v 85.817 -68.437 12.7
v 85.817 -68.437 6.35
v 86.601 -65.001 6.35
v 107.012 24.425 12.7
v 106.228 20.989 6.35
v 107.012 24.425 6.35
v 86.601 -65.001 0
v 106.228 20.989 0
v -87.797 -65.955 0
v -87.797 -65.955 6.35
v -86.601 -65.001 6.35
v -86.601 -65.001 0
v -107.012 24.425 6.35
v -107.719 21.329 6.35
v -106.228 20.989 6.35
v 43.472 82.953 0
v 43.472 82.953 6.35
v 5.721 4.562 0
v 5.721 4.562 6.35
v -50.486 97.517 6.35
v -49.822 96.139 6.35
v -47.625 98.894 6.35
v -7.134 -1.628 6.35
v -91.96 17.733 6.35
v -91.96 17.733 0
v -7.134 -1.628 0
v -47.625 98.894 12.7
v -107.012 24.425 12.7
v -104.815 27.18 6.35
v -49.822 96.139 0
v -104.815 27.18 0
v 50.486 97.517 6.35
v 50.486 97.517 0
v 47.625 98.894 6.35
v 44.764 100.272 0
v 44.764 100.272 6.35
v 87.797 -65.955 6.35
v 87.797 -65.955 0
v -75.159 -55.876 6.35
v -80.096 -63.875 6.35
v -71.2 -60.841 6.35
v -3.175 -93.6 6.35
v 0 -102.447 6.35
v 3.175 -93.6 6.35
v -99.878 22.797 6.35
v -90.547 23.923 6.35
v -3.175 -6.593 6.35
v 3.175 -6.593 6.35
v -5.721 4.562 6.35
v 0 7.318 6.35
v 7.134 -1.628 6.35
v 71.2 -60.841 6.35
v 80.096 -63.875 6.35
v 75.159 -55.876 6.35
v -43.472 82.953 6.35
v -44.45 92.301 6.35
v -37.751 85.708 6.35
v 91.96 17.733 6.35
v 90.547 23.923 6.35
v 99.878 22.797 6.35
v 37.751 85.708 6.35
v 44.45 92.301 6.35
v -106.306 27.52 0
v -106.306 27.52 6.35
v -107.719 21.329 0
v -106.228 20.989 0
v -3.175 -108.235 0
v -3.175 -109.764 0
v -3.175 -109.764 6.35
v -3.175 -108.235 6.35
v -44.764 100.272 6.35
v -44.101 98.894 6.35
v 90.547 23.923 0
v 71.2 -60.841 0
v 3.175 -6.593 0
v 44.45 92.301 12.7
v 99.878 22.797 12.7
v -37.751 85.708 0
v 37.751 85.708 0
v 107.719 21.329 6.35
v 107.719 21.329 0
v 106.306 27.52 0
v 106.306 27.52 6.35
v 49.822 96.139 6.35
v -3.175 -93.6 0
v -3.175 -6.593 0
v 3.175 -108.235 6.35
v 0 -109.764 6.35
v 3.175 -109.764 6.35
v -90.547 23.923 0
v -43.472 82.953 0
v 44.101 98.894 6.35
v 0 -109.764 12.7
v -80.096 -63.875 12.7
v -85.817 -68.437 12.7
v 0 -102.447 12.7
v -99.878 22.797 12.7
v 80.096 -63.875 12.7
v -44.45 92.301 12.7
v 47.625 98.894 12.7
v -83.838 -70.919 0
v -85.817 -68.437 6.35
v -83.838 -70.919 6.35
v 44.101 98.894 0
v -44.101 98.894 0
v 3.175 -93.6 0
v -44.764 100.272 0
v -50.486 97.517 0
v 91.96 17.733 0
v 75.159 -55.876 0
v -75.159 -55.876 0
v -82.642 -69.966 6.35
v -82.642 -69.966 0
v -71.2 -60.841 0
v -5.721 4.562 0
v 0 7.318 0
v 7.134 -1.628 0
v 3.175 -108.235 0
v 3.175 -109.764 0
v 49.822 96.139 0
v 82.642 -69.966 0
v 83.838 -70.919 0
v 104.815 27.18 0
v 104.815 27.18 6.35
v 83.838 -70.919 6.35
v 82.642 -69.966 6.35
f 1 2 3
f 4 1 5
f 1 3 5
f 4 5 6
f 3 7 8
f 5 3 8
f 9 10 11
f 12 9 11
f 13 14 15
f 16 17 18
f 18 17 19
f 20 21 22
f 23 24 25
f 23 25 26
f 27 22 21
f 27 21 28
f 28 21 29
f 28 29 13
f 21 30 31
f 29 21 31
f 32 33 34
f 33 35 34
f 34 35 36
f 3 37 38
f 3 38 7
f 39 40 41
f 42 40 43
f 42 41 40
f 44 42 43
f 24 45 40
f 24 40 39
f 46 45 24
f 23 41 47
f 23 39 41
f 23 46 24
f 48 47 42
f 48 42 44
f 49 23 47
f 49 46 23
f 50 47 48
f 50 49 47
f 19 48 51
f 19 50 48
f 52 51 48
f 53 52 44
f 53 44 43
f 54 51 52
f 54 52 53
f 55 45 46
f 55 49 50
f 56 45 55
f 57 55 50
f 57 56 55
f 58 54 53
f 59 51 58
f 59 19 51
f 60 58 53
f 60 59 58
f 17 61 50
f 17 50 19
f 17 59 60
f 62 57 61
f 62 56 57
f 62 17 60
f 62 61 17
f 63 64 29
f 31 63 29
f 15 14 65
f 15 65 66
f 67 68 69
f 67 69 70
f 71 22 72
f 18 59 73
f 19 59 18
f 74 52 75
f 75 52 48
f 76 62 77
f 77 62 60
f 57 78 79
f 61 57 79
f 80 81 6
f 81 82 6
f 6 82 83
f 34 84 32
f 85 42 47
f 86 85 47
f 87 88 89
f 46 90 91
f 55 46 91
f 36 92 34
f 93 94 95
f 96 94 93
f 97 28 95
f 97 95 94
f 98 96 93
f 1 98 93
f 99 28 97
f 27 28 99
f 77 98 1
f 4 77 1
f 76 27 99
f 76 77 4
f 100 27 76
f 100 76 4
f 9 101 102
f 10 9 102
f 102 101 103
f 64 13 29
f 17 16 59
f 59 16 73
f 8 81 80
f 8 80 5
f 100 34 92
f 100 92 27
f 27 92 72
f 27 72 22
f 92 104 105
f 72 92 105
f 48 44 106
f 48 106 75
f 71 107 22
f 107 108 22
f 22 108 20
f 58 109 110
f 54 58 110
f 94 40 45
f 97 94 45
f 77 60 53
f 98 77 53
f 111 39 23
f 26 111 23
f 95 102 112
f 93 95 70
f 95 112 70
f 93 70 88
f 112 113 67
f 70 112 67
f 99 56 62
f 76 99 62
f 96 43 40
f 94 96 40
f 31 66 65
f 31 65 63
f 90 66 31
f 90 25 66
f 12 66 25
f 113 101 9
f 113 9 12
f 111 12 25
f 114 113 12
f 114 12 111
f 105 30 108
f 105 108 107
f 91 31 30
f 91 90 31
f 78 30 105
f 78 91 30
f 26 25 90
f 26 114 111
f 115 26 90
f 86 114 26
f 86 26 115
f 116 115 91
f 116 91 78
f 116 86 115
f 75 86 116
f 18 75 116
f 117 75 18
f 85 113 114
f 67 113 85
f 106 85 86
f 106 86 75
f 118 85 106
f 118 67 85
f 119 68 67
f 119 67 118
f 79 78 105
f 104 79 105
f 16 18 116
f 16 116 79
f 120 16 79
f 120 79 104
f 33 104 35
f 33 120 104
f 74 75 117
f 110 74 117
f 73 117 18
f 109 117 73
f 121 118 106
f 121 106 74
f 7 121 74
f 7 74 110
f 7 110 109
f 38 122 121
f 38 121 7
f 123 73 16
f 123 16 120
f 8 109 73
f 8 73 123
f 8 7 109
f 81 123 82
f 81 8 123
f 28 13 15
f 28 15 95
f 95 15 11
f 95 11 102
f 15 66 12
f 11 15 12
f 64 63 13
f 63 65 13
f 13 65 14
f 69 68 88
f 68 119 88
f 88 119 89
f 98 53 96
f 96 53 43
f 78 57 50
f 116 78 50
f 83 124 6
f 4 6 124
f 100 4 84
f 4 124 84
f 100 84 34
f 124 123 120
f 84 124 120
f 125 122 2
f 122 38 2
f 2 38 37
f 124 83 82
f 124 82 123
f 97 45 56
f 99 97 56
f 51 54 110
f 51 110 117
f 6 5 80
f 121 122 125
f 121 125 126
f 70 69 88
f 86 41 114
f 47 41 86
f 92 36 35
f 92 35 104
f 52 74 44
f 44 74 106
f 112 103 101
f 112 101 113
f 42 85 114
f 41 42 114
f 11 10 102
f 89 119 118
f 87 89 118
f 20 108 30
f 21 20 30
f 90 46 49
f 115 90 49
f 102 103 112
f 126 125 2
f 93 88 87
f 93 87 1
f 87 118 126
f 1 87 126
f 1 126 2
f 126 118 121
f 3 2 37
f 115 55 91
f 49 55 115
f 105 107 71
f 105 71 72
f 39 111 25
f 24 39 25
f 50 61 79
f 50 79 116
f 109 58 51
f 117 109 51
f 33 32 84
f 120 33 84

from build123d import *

# Parameters (mm, degrees)
F1_E8_W   = 109.7644269796
F1_E8_H   = 6.35
F2_DEPTH  = 3.175
F1_E7_W   = 109.7644269796
F1_E7_H   = 6.35
F3_DEPTH  = 3.175
F4_E6_W   = 109.7644269796
F4_E6_H   = 6.35
F5_DEPTH  = 3.175
F4_E5_W   = 109.7644269796
F4_E5_H   = 6.35
F6_DEPTH  = 3.175
F7_E4_W   = 109.7644269796
F7_E4_H   = 6.35
F8_DEPTH  = 3.175
F7_E3_W   = 109.7644269796
F7_E3_H   = 6.35
F9_DEPTH  = 3.175
F10_E9_W  = 109.7644269796
F10_E9_H  = 6.35
F11_DEPTH = 3.175
F12_DEPTH = 12.7
F13_DEPTH = 6.35


with BuildPart() as f2:
    # F1_E8 (on explicit) → F2 (new body, symmetric)
    with BuildSketch(Plane(origin=(0, -109.7644269796, 0), x_dir=(0, 1, 0), z_dir=(1, 0, 0))):
        with Locations((54.8822134898, 3.175)):
            Rectangle(F1_E8_W, F1_E8_H)
    extrude(amount=F2_DEPTH, both=True)

    # F1_E7 (on explicit) → F3 (join, symmetric)
    with BuildSketch(Plane(origin=(85.8172846677, -68.4370008286, 0), x_dir=(-0.7818314825, 0.6234898019, 0), z_dir=(0.6234898019, 0.7818314825, 0))):
        with Locations((54.8822134898, 3.175)):
            Rectangle(F1_E7_W, F1_E7_H)
    extrude(amount=F3_DEPTH, both=True)

    # F4_E6 (on explicit) → F5 (join, symmetric)
    with BuildSketch(Plane(origin=(107.012403627, 24.4248828067, 0), x_dir=(-0.9749279122, -0.222520934, 0), z_dir=(-0.222520934, 0.9749279122, 0))):
        with Locations((54.8822134898, 3.175)):
            Rectangle(F4_E6_W, F4_E6_H)
    extrude(amount=F5_DEPTH, both=True)

    # F4_E5 (on explicit) → F6 (join, symmetric)
    with BuildSketch(Plane(origin=(47.625, 98.8943315118, 0), x_dir=(-0.4338837391, -0.9009688679, 0), z_dir=(-0.9009688679, 0.4338837391, 0))):
        with Locations((54.8822134898, 3.175)):
            Rectangle(F4_E5_W, F4_E5_H)
    extrude(amount=F6_DEPTH, both=True)

    # F7_E4 (on explicit) → F8 (join, symmetric)
    with BuildSketch(Plane(origin=(-47.625, 98.8943315118, 0), x_dir=(0.4338837391, -0.9009688679, 0), z_dir=(-0.9009688679, -0.4338837391, 0))):
        with Locations((54.8822134898, 3.175)):
            Rectangle(F7_E4_W, F7_E4_H)
    extrude(amount=F8_DEPTH, both=True)

    # F7_E3 (on explicit) → F9 (join, symmetric)
    with BuildSketch(Plane(origin=(-107.012403627, 24.4248828067, 0), x_dir=(0.9749279122, -0.222520934, 0), z_dir=(-0.222520934, -0.9749279122, 0))):
        with Locations((54.8822134898, 3.175)):
            Rectangle(F7_E3_W, F7_E3_H)
    extrude(amount=F9_DEPTH, both=True)

    # F10_E9 (on explicit) → F11 (join, symmetric)
    with BuildSketch(Plane(origin=(-85.8172846677, -68.4370008286, 0), x_dir=(0.7818314825, 0.6234898019, 0), z_dir=(0.6234898019, -0.7818314825, 0))):
        with Locations((54.8822134898, 3.175)):
            Rectangle(F10_E9_W, F10_E9_H)
    extrude(amount=F11_DEPTH, both=True)

    # F0 (on Top) → F12 (join)
    with BuildSketch(Plane.XY):
        Polygon((44.45, 92.3013760776), (47.625, 98.8943315118), (-47.625, 98.8943315118), (-44.45, 92.3013760776), align=None)
        Polygon((99.8782433852, 22.7965572862), (107.012403627, 24.4248828067), (47.625, 98.8943315118), (44.45, 92.3013760776), align=None)
        Polygon((80.0961323565, -63.8745341067), (85.8172846677, -68.4370008286), (107.012403627, 24.4248828067), (99.8782433852, 22.7965572862), align=None)
        Polygon((0, -109.7644269796), (85.8172846677, -68.4370008286), (80.0961323565, -63.8745341067), (0, -102.4467985143), align=None)
        Polygon((-85.8172846677, -68.4370008286), (0, -109.7644269796), (0, -102.4467985143), (-80.0961323565, -63.8745341067), align=None)
        Polygon((-107.012403627, 24.4248828067), (-85.8172846677, -68.4370008286), (-80.0961323565, -63.8745341067), (-99.8782433852, 22.7965572862), align=None)
        Polygon((-47.625, 98.8943315118), (-107.012403627, 24.4248828067), (-99.8782433852, 22.7965572862), (-44.45, 92.3013760776), align=None)
    extrude(amount=F12_DEPTH)

    # F0 (on Top) → F13 (join)
    with BuildSketch(Plane.XY):
        Polygon((92.7440831434, 21.1682317658), (99.8782433852, 22.7965572862), (44.45, 92.3013760776), (41.275, 85.7084206435), align=None)
        Polygon((41.275, 85.7084206435), (44.45, 92.3013760776), (-44.45, 92.3013760776), (-41.275, 85.7084206435), align=None)
        Polygon((-44.45, 92.3013760776), (-99.8782433852, 22.7965572862), (-92.7440831434, 21.1682317658), (-41.275, 85.7084206435), align=None)
        Polygon((-99.8782433852, 22.7965572862), (-80.0961323565, -63.8745341067), (-74.3749800453, -59.3120673848), (-92.7440831434, 21.1682317658), align=None)
        Polygon((-80.0961323565, -63.8745341067), (0, -102.4467985143), (0, -95.129170049), (-74.3749800453, -59.3120673848), align=None)
        Polygon((0, -102.4467985143), (80.0961323565, -63.8745341067), (74.3749800453, -59.3120673848), (0, -95.129170049), align=None)
        Polygon((74.3749800453, -59.3120673848), (80.0961323565, -63.8745341067), (99.8782433852, 22.7965572862), (92.7440831434, 21.1682317658), align=None)
    extrude(amount=F13_DEPTH)


solid = f2.part
